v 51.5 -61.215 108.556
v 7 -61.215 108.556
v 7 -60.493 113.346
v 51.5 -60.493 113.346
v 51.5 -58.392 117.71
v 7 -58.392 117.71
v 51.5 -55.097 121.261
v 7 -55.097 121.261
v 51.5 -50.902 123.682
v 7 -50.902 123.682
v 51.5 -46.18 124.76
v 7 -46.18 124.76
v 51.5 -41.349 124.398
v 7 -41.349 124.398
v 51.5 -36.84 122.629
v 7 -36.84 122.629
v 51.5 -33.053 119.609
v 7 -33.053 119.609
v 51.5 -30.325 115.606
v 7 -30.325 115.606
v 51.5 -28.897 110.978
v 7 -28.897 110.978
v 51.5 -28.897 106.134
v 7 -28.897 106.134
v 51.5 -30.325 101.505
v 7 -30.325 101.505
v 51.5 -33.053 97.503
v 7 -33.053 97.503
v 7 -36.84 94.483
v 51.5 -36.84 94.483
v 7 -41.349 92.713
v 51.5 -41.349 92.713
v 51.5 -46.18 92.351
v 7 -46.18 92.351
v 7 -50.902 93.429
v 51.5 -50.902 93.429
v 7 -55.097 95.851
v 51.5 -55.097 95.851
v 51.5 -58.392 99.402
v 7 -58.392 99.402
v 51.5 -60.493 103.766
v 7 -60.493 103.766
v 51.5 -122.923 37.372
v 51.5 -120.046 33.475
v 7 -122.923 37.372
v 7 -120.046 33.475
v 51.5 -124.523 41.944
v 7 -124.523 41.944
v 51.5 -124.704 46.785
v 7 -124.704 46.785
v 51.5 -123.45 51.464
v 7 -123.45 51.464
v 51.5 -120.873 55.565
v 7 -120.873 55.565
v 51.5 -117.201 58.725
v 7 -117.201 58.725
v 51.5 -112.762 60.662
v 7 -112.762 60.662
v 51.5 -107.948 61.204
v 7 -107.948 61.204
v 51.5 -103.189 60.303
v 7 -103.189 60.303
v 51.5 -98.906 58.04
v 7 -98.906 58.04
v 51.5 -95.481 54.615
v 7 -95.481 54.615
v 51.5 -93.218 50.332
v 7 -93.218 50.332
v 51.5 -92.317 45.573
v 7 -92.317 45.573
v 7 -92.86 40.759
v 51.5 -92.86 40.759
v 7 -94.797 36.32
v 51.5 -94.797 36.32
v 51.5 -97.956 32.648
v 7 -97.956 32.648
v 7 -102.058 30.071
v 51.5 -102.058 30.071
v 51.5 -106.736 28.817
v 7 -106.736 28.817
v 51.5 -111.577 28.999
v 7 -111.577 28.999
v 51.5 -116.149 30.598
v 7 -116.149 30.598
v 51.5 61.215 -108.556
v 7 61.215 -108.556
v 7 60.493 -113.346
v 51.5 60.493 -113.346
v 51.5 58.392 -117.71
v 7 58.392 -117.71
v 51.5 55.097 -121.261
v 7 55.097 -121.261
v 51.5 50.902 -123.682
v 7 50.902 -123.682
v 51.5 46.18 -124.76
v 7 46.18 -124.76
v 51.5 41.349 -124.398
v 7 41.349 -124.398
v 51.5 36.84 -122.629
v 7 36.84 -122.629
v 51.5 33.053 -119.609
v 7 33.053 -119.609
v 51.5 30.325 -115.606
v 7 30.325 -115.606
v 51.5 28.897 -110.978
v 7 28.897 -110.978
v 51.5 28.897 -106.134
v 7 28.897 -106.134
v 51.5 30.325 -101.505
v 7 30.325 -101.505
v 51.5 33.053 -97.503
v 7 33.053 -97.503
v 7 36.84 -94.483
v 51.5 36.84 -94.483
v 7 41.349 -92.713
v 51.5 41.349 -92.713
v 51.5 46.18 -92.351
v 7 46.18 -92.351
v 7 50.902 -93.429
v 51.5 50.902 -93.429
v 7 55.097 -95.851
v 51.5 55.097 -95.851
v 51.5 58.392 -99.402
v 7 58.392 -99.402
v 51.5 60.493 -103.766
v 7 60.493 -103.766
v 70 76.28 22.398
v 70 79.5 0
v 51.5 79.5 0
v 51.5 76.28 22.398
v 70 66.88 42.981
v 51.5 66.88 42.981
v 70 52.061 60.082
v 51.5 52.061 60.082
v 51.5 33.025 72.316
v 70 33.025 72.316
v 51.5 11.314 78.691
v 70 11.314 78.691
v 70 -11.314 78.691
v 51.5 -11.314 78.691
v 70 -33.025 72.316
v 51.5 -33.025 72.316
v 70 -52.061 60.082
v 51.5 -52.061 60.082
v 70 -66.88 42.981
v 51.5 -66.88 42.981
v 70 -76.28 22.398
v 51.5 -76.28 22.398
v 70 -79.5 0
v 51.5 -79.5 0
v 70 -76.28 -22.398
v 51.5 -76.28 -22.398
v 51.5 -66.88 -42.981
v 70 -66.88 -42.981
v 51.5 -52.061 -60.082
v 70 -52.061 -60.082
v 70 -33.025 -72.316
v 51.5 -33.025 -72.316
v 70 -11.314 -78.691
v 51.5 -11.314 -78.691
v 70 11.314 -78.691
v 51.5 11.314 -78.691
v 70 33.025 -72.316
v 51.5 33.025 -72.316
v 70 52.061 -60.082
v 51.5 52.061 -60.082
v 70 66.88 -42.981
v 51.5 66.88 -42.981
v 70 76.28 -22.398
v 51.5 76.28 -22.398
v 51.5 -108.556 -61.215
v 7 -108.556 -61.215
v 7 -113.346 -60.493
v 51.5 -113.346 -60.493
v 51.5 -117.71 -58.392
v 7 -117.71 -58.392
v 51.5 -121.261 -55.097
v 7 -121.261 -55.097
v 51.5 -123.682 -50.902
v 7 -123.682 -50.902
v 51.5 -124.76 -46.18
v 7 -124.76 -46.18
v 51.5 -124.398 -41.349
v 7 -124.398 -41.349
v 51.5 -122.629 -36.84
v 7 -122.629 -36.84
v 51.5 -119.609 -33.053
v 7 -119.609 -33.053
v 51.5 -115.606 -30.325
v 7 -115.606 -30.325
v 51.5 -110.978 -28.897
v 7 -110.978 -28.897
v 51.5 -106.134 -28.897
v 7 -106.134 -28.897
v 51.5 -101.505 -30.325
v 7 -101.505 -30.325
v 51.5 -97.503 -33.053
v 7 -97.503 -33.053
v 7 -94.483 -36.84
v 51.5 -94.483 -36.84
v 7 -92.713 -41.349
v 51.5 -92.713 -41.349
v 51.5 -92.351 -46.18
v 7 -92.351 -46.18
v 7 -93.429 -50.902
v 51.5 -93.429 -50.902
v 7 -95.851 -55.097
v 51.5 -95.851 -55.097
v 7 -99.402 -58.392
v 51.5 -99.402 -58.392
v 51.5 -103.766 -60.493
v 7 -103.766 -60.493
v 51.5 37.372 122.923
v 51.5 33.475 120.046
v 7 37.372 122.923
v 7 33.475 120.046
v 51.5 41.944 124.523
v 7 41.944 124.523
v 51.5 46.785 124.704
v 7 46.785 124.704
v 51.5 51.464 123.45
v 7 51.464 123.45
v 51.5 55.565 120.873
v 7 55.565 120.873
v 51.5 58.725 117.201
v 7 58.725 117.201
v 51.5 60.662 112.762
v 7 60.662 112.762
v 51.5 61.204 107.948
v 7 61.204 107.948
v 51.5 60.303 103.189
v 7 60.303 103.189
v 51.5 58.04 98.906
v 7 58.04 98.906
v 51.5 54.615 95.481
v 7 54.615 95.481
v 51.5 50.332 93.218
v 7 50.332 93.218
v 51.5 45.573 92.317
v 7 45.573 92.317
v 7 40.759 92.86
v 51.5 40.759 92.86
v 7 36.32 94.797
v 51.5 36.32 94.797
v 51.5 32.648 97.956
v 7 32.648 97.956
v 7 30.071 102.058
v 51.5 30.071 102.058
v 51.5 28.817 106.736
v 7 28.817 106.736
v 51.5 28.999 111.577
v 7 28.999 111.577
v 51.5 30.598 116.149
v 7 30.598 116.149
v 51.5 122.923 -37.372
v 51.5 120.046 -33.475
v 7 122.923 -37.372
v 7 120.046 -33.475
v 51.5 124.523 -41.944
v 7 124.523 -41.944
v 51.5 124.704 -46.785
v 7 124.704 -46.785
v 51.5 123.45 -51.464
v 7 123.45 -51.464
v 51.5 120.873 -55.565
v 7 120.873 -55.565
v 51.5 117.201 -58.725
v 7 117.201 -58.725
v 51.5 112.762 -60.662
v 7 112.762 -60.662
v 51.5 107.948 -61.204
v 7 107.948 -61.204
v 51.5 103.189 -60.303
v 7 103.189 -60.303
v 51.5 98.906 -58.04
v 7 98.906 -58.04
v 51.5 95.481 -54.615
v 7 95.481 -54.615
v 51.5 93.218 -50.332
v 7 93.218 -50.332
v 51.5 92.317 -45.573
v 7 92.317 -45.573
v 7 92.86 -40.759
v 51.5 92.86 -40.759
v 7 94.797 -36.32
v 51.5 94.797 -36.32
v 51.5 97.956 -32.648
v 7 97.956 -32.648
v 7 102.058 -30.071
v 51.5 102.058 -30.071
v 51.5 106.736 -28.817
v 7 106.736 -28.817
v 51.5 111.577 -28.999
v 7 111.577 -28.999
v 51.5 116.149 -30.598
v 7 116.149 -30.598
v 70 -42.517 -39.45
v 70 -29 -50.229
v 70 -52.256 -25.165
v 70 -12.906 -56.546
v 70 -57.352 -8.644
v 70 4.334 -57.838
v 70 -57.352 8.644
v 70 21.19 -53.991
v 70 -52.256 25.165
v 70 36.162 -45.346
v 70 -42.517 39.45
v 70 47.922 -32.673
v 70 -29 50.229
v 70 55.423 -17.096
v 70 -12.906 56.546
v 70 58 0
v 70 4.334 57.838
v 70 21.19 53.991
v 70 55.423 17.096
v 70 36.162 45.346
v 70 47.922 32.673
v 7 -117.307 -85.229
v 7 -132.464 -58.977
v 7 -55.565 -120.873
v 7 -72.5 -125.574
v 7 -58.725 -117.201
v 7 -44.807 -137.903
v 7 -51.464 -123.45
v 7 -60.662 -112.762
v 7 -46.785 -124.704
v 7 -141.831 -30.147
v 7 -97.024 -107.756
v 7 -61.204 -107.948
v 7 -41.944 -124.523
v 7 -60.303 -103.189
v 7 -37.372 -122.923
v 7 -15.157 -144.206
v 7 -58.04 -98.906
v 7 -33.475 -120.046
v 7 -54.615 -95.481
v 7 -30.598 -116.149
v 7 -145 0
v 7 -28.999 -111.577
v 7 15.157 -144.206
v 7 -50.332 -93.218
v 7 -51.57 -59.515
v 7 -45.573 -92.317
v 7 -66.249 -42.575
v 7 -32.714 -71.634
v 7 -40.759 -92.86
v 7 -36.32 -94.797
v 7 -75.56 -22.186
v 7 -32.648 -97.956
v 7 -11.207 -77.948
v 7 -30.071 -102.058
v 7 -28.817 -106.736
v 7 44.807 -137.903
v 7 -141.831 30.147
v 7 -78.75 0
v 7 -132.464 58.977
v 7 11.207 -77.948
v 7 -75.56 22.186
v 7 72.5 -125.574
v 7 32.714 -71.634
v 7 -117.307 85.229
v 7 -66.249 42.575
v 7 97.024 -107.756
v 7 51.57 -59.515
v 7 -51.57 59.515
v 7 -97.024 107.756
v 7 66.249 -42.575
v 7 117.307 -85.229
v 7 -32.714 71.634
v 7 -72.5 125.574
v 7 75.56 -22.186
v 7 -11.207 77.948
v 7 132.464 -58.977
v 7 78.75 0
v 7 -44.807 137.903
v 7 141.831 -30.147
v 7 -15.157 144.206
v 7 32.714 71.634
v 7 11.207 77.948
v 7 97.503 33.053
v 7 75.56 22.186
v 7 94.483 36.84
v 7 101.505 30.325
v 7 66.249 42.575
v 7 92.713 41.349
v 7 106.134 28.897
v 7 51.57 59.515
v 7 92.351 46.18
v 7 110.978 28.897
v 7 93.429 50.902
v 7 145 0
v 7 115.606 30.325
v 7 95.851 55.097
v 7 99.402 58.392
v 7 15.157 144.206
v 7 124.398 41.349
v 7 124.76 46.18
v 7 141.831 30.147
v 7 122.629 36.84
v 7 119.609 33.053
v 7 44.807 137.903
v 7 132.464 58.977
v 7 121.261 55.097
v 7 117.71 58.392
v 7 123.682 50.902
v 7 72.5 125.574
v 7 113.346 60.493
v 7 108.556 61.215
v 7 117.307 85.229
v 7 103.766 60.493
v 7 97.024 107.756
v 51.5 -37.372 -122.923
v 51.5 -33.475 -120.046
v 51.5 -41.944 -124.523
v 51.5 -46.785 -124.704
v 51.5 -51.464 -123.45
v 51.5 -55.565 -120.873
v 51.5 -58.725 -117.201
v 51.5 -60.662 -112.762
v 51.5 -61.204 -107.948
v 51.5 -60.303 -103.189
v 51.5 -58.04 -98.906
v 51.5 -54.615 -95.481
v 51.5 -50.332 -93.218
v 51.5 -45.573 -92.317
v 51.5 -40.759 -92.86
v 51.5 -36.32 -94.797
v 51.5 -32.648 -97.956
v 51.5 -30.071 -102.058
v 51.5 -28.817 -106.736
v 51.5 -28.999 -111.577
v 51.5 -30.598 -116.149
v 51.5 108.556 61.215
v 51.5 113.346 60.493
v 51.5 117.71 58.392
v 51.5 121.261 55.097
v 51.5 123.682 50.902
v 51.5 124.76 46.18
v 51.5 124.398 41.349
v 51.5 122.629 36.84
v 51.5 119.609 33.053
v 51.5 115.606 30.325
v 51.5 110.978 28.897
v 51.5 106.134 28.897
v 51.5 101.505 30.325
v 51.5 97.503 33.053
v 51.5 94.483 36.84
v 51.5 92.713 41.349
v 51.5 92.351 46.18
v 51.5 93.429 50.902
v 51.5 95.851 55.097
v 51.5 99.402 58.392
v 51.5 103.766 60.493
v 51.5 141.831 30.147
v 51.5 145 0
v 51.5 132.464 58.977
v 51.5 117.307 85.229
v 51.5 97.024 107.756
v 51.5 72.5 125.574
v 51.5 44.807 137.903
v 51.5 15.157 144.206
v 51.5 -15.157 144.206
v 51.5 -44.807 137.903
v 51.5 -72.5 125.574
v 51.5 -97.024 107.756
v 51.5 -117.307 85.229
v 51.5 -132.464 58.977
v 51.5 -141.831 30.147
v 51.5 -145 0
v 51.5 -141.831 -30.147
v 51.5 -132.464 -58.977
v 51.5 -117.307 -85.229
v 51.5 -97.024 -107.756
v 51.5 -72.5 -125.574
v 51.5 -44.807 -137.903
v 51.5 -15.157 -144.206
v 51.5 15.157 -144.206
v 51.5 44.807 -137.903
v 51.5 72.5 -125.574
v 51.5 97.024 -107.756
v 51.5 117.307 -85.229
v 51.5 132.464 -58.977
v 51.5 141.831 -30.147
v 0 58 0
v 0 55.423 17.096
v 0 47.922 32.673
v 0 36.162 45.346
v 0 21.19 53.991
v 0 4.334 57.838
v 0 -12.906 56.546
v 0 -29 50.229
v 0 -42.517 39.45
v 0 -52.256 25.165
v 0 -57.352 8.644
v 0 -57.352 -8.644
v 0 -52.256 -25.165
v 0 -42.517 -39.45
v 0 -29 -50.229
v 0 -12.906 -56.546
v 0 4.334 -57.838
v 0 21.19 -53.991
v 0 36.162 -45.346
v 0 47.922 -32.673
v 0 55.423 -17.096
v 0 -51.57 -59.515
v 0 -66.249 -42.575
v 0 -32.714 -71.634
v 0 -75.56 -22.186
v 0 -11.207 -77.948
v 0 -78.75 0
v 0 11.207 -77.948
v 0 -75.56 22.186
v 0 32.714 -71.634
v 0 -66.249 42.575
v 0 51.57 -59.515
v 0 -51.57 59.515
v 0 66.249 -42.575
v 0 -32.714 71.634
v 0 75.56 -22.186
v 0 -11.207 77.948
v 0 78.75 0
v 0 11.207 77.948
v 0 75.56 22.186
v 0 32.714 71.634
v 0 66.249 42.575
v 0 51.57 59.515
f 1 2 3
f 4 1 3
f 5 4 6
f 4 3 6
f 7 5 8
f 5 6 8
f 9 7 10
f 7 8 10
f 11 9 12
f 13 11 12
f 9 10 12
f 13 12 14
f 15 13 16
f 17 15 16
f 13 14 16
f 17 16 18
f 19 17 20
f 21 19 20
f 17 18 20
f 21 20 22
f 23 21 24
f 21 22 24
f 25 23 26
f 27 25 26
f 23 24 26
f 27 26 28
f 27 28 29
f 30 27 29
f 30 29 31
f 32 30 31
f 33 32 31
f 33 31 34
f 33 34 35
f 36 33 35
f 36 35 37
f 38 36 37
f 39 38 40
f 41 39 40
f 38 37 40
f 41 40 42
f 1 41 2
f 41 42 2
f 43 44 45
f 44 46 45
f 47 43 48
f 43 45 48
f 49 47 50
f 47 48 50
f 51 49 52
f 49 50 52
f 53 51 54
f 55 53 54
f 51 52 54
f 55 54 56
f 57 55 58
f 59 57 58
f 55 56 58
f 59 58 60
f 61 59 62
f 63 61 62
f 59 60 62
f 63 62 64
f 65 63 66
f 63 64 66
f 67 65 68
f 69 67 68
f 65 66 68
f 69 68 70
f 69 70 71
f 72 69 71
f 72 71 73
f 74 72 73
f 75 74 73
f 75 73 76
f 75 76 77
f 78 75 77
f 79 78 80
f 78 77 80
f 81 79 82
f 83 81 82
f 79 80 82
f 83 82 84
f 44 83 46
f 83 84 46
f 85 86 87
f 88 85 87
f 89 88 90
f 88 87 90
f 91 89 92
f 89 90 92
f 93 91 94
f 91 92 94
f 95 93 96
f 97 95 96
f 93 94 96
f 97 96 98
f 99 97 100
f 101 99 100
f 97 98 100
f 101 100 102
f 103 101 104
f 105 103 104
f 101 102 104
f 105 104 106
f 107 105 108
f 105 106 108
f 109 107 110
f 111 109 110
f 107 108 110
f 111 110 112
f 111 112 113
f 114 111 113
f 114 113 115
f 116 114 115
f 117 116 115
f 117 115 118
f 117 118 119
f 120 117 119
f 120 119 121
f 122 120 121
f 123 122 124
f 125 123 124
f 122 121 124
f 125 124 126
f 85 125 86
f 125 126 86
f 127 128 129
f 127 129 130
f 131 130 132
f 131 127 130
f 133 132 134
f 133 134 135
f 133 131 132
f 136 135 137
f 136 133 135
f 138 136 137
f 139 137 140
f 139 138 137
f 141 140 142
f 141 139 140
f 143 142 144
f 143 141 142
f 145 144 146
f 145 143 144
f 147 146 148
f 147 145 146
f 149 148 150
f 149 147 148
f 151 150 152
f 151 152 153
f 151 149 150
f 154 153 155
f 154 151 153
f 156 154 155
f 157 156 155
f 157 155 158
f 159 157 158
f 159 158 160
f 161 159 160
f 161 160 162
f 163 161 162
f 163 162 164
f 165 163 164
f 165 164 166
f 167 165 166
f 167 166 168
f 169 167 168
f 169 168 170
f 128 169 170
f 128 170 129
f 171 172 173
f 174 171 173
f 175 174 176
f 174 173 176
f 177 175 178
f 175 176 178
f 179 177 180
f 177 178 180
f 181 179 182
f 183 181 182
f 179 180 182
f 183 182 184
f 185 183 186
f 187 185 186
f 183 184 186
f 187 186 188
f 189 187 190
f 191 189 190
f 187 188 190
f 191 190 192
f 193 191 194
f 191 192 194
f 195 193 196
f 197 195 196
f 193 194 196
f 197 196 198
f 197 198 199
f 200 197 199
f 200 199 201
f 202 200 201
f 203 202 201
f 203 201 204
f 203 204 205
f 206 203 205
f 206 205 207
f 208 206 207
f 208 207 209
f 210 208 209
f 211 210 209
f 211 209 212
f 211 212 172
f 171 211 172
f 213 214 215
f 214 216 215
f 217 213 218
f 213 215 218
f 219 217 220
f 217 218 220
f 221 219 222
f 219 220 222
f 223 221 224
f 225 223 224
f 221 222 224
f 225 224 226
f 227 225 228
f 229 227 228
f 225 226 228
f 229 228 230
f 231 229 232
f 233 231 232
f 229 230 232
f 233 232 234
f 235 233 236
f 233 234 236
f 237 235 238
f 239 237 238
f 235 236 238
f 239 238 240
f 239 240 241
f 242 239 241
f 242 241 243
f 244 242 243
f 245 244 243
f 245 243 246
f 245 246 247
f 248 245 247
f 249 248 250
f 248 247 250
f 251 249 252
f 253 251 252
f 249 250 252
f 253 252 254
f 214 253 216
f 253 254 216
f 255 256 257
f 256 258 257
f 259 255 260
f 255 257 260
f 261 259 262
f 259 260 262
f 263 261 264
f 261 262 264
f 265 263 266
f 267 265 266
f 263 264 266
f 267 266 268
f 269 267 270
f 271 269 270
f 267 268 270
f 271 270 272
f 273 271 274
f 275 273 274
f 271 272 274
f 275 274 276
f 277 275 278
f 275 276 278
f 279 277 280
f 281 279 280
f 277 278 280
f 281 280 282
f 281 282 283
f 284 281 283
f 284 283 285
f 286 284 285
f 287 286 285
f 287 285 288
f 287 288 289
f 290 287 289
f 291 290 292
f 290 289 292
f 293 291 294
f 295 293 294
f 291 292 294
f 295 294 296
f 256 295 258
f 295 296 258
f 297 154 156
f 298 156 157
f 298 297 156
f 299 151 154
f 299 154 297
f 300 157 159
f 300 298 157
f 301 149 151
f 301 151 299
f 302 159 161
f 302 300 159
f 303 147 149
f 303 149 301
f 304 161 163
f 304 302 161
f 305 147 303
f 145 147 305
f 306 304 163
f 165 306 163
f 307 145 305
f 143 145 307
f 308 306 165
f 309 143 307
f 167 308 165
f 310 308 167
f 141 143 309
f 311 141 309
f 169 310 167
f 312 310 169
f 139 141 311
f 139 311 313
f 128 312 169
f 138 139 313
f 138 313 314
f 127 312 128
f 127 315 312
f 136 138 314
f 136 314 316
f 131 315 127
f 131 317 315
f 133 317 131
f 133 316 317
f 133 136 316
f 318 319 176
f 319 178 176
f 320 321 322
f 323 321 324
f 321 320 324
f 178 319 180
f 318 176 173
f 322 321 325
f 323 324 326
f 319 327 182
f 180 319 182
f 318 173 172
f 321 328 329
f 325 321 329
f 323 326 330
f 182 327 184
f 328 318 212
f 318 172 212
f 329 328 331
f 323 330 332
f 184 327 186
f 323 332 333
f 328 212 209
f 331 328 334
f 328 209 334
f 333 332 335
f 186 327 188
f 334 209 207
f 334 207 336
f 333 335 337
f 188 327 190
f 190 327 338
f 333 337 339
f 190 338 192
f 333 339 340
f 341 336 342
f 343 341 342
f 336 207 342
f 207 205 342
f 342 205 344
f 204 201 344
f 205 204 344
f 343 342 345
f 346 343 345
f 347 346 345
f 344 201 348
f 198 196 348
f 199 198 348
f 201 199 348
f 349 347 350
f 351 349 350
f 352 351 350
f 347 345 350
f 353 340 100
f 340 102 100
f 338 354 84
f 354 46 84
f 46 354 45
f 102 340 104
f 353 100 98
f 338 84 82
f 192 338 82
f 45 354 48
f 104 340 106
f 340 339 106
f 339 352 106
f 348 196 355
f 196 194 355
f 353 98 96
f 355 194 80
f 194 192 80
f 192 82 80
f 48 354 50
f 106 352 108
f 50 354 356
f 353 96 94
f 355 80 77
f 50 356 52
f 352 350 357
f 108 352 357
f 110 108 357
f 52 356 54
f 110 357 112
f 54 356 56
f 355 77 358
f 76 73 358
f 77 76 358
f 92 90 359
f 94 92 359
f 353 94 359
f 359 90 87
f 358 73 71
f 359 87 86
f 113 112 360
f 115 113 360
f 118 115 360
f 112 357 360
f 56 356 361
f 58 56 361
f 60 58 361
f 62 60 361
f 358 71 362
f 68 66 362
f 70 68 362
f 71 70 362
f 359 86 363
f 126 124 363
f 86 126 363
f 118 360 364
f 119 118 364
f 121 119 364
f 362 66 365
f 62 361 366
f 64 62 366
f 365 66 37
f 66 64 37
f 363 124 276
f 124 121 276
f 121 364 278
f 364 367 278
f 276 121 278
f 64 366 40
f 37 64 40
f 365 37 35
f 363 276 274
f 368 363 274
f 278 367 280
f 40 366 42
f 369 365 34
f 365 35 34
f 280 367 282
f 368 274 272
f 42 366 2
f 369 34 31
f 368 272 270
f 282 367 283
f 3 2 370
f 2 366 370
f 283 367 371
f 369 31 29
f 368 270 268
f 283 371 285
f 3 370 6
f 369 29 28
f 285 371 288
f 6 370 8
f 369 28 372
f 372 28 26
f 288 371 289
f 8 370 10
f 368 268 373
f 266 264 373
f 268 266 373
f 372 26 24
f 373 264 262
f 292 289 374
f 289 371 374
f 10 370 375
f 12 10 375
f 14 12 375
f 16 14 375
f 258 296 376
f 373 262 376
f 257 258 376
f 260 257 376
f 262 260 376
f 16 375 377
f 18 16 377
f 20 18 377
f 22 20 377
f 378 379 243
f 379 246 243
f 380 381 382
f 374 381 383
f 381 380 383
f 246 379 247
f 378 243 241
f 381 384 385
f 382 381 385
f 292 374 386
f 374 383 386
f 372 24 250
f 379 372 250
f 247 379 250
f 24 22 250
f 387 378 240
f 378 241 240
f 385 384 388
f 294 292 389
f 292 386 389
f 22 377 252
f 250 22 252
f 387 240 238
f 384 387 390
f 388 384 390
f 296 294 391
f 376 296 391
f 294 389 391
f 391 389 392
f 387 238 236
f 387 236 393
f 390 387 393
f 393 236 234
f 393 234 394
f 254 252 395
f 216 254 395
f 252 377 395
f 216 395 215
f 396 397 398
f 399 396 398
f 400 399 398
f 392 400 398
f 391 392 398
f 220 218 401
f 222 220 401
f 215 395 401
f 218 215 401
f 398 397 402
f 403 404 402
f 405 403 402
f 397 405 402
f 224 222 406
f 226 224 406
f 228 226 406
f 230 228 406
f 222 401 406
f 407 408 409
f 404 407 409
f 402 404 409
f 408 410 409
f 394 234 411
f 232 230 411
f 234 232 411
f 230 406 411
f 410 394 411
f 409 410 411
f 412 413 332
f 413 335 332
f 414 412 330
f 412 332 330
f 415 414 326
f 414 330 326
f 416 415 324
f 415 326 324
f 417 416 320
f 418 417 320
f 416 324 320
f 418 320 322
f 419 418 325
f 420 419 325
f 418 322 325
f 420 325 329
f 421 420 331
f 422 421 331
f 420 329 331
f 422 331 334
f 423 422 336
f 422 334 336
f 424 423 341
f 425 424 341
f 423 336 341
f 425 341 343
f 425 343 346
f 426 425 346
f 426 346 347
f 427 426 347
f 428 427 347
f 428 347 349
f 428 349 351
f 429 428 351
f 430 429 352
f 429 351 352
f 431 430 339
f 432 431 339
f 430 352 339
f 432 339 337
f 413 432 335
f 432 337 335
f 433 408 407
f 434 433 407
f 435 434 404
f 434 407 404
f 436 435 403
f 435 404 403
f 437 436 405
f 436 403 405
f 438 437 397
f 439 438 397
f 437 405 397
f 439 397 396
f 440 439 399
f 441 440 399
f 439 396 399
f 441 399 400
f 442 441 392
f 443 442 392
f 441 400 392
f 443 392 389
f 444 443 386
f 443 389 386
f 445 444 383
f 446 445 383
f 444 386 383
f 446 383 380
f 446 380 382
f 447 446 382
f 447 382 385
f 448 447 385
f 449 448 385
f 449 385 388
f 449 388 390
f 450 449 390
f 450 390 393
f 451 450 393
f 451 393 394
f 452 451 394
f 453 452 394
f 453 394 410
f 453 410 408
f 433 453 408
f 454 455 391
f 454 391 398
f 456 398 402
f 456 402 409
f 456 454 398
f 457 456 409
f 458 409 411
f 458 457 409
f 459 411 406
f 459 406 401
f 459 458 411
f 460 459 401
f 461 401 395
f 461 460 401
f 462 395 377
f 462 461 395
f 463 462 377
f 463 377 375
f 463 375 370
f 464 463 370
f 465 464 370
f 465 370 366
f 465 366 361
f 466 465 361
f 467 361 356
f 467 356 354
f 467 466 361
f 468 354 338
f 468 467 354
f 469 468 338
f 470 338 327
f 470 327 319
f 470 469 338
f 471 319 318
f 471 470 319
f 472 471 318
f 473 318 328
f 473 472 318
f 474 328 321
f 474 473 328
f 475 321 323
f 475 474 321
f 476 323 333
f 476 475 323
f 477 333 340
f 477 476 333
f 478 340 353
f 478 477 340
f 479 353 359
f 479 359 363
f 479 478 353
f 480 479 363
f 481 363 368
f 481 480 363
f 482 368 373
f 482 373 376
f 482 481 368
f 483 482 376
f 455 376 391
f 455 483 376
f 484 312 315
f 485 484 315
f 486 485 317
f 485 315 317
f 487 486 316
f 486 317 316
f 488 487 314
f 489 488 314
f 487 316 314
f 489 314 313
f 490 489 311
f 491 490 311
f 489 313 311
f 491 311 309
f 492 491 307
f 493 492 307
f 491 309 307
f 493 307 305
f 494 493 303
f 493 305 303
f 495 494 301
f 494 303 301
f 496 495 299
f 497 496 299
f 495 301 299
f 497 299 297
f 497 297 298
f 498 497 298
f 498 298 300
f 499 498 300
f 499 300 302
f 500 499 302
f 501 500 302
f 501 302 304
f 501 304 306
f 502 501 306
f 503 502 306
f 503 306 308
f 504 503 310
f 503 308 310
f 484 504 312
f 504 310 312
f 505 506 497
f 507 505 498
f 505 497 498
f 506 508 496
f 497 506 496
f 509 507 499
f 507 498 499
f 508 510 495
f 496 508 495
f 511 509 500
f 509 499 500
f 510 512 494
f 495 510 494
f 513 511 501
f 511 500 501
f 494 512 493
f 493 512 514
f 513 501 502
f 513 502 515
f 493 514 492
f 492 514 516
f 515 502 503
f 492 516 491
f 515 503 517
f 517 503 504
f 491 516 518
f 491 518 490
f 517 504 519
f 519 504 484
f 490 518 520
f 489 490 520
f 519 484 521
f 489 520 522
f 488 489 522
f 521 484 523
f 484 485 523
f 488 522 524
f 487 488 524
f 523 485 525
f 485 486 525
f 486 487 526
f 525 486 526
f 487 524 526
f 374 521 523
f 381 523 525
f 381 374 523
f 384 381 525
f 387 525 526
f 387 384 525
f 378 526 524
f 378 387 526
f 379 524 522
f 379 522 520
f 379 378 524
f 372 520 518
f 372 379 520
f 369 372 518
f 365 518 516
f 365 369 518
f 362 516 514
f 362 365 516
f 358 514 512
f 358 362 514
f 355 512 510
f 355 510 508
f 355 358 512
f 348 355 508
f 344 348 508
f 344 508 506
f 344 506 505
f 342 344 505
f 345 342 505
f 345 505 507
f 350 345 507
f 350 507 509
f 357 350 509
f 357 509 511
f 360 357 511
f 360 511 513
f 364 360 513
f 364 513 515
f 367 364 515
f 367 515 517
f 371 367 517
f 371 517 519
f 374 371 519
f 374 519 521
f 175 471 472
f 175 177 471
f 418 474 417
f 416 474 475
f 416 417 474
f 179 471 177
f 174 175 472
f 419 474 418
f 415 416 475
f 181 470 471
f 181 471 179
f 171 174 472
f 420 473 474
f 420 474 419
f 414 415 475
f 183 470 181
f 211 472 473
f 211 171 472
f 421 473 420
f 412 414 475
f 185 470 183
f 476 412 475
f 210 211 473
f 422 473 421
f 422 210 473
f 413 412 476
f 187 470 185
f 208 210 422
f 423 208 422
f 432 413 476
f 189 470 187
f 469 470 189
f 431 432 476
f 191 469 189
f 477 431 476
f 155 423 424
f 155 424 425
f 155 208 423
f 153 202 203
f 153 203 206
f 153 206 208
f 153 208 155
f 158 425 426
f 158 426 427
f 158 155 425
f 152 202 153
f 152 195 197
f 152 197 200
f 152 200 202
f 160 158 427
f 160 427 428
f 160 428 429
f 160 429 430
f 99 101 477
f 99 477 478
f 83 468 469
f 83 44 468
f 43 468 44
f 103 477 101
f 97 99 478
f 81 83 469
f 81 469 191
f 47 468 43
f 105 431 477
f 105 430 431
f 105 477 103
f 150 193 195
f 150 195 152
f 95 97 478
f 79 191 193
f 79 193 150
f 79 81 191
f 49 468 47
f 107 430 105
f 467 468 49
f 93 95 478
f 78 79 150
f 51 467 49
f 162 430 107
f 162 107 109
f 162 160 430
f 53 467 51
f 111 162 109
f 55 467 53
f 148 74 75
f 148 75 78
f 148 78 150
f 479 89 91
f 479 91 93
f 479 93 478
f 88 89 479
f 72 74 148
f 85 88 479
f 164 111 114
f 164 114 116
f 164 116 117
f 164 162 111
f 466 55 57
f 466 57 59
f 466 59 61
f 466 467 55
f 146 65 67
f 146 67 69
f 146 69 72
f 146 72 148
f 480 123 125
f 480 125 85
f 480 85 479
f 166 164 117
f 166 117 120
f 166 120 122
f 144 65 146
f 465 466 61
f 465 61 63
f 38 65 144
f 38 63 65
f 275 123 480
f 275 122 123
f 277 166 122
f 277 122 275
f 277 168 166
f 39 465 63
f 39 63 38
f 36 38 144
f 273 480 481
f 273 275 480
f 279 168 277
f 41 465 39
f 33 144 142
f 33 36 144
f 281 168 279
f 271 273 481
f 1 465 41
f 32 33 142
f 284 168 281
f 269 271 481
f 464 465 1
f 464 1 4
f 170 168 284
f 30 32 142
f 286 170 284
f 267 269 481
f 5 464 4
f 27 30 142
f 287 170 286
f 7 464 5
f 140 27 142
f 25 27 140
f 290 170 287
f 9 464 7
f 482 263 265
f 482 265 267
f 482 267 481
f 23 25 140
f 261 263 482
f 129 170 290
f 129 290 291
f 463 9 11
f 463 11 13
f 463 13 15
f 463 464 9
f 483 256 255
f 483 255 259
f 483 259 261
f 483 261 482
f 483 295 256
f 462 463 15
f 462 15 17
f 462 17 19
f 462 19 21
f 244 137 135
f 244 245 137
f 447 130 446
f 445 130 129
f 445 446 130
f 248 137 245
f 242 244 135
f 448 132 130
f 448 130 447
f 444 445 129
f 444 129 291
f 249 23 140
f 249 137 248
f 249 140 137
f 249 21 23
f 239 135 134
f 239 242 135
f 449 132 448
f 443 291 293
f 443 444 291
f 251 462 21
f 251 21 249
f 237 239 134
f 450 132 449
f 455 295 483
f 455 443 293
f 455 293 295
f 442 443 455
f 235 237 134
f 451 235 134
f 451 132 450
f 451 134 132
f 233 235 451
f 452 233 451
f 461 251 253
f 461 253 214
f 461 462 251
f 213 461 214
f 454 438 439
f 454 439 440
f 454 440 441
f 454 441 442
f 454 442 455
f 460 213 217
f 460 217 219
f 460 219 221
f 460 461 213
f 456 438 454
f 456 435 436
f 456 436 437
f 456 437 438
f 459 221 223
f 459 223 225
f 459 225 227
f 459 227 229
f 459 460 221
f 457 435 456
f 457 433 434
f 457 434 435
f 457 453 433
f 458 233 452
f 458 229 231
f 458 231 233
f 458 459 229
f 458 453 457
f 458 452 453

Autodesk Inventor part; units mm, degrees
ref_plane "YZ Plane" through (0, 0, 0) normal (1, 0, 0) x (0, 1, 0)
ref_plane "XZ Plane" through (0, 0, 0) normal (0, 1, 0) x (-1, 0, 0)
ref_plane "XY Plane" through (0, 0, 0) normal (0, 0, 1) x (1, 0, 0)
sketch "Sketch1" plane through (0, 0, 0) normal (0, 0, 1) x (1, 0, 0)
  line L0 (0, 0) -> (70, 0) construction
  line L1 (0, 58) -> (0, 78.75)
  line L2 (0, 78.75) -> (7, 78.75)
  line L3 (7, 145) -> (51.5, 145)
  line L4 (0, 58) -> (0, 0) construction
  line L5 (7, 145) -> (7, 78.75)
  line L6 (51.5, 145) -> (51.5, 79.5)
  line L7 (0, 58) -> (70, 58)
  line L8 (70, 58) -> (70, 0) construction
  line L9 (51.5, 79.5) -> (70, 79.5)
  line L10 (70, 79.5) -> (70, 58)
  dimension "d0" = 157.5
  dimension "d1" = 290
  dimension "d2" = 159
  dimension "d3" = 7
  dimension "d8" = 70
  dimension "d9" = 116
  dimension "d10" = 44.5
revolve "Revolution1" add sketch "Sketch1" angle 360 about axis through (0, 0, 0) along (1, 0, 0)
sketch "Sketch2" plane through (7, 0, 0) normal (-1, 0, 0) x (0, 0, 1)
  circle A0 centre (0, 0) radius 78.75 projected
  line L0 (0, 0) -> (0, 117.5) construction
  circle A1 centre (0, 0) radius 145 projected
  circle A2 centre (0, 0) radius 117.5 construction
  line L1 (0, 0) -> (44.9653, 108.5558) construction
  circle A3 centre (44.9653, 108.5558) radius 16.25
  dimension "d12" = 32.5
  dimension "d13" = 235
  dimension "d14" = 22.5
extrude "Extrusion1" cut sketch "Sketch2" against normal blind 44.5 contours A3
pattern_circular "Circular Pattern1" count 8 over 360 about axis through (3.5, 0, 0) along (1, 0, 0) of "Extrusion1"
equation "\"d0\" = D1"
equation "\"d1\" = D"
equation "\"d2\" = N2"
equation "\"d3\" = F2"
equation "\"d8\" = H1"
equation "\"d9\" = B1"
equation "\"d10\" = C2"
equation "\"d12\" = L"
equation "\"d13\" = K1"
equation "\"d4\" = C2"
equation "\"C2\" = 44.5"
equation "\"D\" = 290"
equation "\"K1\" = 235"
equation "\"L\" = 32.5"
equation "\"N2\" = 159"
equation "\"D1\" = 157.5"
equation "\"H1\" = 70"
equation "\"F2\" = 7"
equation "\"B1\" = 116"
equation "\"Size_Designation\" = 1.2345"
properties part number "ISO 7005-1 Hubbed Slip-On Flange for Welding Type 12 - ISO PN 150 DN100" material "Steel"
